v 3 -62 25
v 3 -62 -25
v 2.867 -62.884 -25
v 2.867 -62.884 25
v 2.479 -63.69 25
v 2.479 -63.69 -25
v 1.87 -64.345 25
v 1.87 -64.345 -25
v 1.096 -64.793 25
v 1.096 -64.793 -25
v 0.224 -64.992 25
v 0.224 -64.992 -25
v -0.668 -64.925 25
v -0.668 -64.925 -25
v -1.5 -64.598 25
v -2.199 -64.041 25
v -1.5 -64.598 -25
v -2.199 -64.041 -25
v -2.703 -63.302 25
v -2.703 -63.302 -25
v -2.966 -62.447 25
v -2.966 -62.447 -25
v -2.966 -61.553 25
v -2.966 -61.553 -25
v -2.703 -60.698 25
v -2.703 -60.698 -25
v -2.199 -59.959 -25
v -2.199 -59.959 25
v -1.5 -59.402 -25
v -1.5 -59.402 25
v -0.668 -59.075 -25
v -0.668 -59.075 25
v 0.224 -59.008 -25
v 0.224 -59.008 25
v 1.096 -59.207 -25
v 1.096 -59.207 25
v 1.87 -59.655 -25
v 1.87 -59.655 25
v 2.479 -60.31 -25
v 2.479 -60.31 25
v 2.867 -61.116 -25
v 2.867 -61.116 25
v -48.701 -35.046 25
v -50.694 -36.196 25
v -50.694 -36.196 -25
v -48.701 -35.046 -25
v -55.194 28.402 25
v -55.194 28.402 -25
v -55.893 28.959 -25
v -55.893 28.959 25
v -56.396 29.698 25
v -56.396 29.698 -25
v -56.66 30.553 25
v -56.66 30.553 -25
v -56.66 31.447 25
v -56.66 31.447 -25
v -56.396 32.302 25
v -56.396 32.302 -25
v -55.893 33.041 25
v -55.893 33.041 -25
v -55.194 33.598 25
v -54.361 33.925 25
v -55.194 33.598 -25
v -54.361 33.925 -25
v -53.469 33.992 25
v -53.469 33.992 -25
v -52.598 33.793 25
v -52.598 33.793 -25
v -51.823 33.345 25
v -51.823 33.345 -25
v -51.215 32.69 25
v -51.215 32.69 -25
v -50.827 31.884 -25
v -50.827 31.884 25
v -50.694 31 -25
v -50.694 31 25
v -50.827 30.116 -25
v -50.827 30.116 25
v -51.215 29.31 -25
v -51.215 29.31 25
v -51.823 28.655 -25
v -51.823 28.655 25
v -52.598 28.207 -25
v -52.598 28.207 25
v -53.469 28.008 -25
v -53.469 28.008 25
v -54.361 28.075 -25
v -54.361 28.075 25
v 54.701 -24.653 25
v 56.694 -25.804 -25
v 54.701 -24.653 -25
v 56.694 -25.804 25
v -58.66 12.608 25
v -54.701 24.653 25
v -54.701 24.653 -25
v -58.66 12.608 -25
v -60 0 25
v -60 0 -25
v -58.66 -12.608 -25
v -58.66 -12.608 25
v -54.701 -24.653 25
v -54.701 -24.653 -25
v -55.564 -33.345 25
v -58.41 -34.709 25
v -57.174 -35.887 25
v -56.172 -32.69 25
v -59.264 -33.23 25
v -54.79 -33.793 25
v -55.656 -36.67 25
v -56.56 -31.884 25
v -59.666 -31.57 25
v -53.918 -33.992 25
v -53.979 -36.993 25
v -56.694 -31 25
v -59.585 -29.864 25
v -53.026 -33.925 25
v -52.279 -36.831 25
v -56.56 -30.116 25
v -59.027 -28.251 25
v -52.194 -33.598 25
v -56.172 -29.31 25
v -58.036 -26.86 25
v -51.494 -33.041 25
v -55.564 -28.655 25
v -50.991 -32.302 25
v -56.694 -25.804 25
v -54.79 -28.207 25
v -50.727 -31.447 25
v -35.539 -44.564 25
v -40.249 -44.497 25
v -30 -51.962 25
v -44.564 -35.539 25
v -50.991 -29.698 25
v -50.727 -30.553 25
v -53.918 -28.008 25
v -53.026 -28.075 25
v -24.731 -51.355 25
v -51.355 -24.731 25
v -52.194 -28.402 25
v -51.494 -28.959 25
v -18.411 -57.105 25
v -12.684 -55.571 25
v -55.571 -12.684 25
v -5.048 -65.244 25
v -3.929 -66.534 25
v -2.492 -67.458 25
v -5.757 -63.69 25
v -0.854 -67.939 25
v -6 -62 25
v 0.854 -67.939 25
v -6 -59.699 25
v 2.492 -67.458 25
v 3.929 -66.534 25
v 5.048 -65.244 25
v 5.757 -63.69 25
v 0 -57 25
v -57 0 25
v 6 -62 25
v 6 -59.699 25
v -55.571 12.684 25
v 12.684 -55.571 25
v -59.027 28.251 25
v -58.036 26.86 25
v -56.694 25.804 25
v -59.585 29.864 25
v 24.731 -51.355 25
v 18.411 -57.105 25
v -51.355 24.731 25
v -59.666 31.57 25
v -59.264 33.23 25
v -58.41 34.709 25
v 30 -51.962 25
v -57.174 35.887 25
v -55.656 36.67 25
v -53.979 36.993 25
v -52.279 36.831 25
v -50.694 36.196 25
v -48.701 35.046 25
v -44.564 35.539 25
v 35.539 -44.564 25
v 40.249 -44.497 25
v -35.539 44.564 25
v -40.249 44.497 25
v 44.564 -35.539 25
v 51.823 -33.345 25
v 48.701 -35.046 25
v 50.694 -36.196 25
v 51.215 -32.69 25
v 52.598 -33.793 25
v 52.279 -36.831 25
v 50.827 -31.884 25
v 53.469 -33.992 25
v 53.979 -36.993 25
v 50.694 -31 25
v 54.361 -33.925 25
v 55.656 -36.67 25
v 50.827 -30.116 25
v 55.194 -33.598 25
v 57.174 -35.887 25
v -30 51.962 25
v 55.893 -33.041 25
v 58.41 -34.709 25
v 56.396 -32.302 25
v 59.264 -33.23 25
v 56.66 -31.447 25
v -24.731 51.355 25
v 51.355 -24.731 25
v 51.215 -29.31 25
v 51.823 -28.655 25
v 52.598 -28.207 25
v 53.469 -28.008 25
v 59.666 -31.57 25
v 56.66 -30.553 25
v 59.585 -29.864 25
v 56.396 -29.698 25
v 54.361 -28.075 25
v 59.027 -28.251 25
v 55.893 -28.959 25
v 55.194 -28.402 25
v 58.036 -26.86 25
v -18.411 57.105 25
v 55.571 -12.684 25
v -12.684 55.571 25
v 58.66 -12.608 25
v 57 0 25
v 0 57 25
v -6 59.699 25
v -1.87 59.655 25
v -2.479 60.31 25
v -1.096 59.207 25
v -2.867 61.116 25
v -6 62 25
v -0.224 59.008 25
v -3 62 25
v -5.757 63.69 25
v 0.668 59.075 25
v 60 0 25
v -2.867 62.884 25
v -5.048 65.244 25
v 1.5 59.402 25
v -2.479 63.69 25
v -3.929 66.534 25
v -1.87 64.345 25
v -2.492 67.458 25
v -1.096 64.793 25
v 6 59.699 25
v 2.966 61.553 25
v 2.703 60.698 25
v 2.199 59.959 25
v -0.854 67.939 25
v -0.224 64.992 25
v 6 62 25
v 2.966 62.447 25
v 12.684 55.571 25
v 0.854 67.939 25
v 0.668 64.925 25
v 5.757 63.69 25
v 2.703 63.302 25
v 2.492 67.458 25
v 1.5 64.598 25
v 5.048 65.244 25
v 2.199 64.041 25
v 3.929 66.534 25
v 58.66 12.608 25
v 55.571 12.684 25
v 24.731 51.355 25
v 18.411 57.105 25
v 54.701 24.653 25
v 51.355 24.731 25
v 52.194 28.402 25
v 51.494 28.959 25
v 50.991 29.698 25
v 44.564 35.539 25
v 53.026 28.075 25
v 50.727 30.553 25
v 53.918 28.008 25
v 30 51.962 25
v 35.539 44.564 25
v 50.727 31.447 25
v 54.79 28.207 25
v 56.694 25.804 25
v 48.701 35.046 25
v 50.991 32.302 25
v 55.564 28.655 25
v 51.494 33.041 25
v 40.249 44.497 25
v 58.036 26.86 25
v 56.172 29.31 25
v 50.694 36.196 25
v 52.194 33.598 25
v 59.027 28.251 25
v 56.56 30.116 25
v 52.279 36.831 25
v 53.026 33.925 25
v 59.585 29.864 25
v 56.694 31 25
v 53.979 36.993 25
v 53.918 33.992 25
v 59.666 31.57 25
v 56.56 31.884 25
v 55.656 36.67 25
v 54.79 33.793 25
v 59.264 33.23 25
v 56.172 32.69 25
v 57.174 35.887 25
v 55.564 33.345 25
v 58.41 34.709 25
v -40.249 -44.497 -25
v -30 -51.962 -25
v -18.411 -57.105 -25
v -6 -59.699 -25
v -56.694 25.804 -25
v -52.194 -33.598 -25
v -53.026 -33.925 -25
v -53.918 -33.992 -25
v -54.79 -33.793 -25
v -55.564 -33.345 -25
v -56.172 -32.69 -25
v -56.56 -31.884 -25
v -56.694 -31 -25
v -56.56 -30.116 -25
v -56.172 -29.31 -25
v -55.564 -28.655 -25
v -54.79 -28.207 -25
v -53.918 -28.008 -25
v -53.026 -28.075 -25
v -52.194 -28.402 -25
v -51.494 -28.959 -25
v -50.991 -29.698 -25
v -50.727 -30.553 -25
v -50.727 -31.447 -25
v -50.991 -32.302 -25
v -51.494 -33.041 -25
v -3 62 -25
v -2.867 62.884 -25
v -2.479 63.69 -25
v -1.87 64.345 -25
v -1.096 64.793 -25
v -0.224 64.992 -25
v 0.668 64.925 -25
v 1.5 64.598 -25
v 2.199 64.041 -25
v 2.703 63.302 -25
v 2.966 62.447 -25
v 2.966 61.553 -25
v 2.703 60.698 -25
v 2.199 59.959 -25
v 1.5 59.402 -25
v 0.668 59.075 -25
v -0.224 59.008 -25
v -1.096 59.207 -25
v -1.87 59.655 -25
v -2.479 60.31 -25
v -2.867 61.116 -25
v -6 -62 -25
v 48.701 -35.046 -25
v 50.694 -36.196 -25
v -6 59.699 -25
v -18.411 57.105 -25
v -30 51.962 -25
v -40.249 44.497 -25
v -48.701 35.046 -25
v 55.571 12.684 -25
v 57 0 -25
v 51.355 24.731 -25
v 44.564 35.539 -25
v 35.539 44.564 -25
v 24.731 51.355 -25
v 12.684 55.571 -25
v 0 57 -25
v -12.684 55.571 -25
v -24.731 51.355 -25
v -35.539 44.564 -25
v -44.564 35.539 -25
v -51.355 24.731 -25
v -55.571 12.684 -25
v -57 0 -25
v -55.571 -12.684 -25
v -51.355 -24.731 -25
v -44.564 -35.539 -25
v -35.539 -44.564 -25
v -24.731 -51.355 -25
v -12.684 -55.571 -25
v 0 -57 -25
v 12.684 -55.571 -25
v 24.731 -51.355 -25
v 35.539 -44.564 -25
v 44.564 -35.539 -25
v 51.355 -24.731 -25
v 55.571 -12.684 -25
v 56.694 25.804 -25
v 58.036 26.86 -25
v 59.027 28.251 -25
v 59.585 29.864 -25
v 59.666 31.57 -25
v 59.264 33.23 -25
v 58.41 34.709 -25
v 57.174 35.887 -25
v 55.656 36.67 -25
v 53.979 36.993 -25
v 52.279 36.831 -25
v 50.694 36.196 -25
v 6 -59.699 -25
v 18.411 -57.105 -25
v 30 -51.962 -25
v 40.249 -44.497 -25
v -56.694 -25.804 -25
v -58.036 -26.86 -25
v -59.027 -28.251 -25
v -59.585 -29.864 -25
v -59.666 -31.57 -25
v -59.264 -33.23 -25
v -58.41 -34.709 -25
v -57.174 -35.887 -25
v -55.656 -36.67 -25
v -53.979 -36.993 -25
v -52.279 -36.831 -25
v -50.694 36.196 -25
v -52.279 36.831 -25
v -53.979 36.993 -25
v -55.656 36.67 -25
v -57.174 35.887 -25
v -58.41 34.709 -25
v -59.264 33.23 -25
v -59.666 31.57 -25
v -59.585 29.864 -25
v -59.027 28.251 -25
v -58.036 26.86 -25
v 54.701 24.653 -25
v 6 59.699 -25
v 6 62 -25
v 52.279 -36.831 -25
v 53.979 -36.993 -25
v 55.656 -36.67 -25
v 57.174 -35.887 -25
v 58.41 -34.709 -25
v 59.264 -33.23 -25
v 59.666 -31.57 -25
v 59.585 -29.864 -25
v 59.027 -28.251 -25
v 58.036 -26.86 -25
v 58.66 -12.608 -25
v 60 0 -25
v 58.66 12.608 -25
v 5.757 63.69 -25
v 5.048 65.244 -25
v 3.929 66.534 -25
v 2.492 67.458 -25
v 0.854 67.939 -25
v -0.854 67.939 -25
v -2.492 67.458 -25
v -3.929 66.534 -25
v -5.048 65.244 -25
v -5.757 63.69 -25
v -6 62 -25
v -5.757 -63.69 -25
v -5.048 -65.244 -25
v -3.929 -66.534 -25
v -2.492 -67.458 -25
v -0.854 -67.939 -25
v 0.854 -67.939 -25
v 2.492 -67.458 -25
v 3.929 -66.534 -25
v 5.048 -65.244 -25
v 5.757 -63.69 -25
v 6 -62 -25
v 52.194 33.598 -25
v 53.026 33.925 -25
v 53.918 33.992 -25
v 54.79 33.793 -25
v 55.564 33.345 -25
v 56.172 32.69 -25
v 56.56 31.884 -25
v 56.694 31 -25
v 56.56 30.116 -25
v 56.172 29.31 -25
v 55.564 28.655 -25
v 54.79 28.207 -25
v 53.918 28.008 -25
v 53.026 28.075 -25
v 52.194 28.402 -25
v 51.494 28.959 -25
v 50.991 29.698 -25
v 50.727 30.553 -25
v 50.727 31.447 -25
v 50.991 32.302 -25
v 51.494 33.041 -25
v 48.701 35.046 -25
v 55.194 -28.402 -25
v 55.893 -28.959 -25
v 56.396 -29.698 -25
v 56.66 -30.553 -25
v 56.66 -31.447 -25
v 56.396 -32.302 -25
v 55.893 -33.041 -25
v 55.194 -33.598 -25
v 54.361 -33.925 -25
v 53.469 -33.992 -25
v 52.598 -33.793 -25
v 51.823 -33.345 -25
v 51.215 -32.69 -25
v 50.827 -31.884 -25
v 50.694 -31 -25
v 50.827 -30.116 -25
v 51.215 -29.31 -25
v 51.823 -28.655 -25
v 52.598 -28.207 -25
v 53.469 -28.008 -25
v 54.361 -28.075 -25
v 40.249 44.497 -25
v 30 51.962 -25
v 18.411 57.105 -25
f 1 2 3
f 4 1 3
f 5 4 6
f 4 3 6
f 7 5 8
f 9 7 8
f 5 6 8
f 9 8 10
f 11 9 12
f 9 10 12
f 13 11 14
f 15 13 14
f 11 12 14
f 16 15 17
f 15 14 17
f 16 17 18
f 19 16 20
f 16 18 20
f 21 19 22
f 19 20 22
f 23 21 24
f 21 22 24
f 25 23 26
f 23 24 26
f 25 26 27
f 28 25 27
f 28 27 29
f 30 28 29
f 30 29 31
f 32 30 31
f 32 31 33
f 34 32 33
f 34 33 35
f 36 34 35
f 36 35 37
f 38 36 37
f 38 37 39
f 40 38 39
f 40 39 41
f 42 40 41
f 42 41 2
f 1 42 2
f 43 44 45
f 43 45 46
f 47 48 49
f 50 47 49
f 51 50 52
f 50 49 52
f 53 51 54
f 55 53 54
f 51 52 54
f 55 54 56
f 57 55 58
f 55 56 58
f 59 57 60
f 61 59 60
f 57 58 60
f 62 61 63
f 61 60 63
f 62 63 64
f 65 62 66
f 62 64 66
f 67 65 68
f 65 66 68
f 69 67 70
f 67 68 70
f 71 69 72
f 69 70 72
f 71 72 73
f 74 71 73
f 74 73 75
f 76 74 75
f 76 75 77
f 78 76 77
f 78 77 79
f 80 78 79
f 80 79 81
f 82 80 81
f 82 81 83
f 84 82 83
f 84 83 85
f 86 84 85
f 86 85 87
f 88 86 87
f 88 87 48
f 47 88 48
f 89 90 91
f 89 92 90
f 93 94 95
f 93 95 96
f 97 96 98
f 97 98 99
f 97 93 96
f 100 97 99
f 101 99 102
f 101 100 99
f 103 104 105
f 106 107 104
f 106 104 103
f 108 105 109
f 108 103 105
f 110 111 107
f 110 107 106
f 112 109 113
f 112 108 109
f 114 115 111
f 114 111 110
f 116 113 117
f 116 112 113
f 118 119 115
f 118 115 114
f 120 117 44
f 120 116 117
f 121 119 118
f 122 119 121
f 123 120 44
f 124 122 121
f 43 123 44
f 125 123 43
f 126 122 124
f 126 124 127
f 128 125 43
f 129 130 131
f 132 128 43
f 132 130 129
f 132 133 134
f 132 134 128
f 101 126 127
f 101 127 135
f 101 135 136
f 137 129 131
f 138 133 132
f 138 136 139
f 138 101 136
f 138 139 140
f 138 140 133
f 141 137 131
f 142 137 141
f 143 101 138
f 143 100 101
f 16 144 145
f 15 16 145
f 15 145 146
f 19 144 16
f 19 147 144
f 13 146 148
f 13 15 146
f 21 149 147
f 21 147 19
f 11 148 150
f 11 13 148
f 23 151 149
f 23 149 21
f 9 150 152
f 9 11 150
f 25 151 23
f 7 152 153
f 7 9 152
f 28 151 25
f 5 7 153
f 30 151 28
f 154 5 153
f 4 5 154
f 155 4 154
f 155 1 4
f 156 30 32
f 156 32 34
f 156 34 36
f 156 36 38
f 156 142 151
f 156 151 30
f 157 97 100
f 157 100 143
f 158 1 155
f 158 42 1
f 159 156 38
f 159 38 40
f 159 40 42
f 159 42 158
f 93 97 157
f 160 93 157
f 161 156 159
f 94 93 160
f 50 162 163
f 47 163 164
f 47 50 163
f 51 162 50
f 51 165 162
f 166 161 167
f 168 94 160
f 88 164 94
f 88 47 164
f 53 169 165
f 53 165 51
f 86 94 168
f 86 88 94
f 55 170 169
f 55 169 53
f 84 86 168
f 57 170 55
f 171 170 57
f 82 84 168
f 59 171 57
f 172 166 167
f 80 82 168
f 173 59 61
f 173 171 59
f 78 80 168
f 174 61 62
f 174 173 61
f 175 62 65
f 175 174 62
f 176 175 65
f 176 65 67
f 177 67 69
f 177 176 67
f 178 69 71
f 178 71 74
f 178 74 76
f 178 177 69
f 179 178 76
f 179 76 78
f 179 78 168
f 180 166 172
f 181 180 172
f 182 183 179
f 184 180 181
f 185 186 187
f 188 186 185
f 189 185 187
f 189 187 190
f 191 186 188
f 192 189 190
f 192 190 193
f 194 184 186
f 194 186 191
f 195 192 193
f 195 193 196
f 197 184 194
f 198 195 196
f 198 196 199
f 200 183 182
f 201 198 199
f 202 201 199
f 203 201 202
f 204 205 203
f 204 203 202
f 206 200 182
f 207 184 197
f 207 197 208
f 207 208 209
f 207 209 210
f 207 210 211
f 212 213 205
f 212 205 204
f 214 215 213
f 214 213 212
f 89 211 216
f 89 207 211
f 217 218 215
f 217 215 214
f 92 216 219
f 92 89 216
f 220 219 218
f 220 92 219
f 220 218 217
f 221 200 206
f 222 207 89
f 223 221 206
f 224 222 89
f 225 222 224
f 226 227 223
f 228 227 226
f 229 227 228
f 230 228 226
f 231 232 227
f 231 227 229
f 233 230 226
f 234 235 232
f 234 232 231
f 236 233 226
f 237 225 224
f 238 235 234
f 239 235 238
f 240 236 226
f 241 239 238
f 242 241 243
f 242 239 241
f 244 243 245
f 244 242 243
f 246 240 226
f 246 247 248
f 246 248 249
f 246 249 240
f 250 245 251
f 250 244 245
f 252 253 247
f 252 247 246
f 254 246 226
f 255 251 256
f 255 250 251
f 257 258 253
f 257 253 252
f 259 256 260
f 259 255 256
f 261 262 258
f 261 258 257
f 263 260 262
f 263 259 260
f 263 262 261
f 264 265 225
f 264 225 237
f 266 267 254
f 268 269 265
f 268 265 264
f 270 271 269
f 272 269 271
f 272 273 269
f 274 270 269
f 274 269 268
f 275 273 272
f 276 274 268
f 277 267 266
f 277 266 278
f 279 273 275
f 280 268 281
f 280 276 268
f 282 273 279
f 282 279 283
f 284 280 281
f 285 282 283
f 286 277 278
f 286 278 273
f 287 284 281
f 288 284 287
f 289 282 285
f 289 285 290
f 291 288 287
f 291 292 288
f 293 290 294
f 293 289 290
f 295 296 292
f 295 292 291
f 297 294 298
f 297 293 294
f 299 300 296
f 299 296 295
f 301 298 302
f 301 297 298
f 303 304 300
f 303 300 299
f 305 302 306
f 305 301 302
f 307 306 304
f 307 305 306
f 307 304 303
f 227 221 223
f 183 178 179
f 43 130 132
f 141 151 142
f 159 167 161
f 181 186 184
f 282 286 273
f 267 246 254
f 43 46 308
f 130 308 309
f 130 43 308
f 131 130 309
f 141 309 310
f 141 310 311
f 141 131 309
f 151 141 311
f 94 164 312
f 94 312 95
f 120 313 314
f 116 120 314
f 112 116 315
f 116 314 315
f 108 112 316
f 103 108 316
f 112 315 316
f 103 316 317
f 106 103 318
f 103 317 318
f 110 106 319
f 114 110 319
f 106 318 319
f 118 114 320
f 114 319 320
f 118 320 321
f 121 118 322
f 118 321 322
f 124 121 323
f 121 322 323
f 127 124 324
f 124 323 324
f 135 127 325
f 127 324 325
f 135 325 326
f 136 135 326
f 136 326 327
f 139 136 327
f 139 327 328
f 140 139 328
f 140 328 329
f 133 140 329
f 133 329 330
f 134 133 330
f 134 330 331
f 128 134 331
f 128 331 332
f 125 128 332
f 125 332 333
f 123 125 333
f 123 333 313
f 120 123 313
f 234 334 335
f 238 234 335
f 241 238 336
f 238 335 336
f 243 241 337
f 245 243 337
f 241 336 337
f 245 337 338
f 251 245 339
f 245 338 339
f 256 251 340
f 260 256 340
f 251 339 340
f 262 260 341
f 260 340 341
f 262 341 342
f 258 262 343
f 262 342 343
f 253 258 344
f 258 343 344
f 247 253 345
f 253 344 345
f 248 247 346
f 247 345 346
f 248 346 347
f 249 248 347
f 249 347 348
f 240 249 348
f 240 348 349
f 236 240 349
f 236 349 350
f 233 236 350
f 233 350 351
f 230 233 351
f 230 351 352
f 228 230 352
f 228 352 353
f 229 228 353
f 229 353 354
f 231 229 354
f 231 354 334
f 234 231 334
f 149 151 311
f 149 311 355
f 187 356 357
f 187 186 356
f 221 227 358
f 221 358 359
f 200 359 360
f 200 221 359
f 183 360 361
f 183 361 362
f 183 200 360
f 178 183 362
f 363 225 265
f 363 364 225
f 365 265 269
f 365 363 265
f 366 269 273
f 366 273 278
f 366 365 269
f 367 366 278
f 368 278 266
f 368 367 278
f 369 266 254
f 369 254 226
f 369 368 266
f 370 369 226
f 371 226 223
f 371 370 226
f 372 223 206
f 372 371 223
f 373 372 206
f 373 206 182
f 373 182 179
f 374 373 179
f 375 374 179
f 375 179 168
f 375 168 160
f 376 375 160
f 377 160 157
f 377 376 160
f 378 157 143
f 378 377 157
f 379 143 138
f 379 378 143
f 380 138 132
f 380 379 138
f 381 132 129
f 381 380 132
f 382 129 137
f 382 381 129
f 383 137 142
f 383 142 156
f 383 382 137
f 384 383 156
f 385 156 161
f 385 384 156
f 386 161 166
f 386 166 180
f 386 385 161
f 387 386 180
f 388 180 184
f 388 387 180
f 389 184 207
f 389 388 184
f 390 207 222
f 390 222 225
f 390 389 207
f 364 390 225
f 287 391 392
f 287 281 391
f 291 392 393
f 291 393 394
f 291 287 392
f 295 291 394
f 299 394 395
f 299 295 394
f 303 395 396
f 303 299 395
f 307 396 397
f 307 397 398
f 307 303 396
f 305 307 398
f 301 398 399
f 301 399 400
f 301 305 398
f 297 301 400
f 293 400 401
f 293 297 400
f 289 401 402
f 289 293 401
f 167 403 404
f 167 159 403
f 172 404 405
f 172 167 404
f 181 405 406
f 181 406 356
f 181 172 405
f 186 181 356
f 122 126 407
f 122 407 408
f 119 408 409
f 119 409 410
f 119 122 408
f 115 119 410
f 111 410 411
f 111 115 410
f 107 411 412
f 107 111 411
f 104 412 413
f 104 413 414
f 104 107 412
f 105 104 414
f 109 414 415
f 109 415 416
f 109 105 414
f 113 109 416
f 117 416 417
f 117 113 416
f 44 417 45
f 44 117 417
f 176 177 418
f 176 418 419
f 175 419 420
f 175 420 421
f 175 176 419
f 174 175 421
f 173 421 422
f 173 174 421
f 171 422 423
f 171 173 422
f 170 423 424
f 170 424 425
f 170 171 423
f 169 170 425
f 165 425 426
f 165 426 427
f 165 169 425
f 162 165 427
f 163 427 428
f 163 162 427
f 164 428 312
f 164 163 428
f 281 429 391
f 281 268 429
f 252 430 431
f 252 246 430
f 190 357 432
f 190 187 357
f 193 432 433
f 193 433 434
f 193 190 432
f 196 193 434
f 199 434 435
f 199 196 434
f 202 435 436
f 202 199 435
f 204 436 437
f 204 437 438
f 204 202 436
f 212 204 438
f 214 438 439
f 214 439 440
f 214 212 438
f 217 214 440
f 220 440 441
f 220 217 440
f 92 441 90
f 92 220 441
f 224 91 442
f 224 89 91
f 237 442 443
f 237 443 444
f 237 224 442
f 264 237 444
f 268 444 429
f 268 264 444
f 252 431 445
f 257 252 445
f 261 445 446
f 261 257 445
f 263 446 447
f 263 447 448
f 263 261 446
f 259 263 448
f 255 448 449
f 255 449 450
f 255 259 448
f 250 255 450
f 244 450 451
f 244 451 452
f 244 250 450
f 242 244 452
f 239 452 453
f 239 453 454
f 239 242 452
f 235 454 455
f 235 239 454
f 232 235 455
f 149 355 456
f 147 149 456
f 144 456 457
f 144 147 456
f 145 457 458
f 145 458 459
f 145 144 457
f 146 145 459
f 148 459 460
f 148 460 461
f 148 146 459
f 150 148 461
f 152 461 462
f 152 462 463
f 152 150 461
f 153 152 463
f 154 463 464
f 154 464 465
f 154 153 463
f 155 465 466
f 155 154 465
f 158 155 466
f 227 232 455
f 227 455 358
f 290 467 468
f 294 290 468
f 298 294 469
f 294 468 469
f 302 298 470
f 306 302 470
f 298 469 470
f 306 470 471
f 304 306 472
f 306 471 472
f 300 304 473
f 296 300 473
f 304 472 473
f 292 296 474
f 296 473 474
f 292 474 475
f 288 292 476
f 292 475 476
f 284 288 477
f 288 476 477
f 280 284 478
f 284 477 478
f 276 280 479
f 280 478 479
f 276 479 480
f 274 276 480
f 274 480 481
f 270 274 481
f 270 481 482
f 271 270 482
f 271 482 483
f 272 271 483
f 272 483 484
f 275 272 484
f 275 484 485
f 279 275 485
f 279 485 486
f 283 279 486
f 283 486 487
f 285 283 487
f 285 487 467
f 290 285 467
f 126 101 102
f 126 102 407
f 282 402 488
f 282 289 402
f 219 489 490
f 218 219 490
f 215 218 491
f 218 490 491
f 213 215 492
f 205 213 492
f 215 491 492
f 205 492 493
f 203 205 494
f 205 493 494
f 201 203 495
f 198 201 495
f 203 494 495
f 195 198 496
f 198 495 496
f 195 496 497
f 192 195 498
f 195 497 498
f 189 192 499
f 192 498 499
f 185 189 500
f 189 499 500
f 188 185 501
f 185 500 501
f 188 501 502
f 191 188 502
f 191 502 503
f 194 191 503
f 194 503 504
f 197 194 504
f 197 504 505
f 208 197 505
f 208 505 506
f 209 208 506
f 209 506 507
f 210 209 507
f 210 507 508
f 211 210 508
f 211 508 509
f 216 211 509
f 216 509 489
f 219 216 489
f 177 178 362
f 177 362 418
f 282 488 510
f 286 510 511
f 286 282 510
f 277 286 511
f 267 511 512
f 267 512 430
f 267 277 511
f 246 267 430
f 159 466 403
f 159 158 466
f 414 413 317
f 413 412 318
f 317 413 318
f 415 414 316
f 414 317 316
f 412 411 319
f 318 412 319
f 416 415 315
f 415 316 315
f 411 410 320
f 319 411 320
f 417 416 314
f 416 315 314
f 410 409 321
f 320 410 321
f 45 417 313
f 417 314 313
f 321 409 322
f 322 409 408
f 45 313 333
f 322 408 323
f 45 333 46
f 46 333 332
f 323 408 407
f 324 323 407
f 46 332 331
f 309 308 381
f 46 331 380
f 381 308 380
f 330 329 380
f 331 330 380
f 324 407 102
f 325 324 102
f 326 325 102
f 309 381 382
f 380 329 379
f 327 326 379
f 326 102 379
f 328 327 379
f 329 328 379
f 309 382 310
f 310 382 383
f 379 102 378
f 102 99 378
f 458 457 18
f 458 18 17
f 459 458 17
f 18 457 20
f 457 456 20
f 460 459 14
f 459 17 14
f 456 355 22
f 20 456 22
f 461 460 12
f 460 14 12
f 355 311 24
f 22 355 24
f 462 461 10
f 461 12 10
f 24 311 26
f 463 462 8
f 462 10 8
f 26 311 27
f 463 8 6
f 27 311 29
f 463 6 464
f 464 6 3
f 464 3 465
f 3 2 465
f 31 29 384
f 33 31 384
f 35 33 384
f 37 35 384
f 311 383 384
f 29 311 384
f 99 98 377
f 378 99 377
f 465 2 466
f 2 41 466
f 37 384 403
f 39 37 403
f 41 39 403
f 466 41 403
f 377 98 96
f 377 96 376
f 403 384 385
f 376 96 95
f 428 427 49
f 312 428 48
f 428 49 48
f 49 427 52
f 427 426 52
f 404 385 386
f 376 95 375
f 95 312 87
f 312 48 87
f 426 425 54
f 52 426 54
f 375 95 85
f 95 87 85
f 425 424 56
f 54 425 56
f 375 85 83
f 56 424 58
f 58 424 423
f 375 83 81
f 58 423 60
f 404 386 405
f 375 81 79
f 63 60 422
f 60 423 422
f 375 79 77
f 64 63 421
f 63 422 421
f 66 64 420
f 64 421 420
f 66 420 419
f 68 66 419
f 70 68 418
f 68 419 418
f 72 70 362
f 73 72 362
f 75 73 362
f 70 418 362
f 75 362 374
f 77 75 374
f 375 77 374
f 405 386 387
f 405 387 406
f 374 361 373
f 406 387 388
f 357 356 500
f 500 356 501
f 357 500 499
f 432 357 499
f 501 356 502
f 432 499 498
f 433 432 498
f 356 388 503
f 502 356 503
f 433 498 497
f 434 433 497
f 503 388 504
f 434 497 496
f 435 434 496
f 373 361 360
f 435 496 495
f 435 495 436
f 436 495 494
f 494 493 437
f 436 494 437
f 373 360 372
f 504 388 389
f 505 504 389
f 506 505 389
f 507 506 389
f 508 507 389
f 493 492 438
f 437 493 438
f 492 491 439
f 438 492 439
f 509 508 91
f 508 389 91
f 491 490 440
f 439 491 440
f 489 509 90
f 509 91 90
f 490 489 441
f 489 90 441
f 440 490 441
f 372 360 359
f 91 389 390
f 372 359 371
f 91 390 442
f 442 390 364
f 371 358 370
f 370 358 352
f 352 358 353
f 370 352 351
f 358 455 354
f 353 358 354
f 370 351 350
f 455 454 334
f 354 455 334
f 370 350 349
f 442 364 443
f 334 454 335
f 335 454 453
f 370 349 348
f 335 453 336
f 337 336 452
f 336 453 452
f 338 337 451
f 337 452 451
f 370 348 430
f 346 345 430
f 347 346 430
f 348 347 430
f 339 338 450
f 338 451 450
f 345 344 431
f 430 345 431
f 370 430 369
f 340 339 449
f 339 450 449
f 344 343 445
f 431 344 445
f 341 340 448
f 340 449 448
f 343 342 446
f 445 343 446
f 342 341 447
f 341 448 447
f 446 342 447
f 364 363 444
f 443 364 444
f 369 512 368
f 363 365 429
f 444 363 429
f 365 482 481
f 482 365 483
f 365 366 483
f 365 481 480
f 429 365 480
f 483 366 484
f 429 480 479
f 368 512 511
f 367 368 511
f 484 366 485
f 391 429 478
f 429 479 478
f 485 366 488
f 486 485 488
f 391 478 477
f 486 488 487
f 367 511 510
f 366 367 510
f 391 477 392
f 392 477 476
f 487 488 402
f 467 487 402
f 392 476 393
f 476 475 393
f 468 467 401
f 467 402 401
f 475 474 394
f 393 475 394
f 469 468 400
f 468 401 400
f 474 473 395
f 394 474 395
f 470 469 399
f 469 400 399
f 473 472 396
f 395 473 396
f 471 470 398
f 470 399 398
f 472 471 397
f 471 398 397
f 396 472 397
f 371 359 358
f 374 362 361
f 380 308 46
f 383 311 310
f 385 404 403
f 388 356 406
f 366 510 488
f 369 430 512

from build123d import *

# Parameters (mm, degrees)
SKETCH1_R           = 57
BOSS_EXTRUDE1_DEPTH = 25
SKETCH3_R           = 3
CUT_EXTRUDE1_DEPTH  = 104.556747728
CIRPATTERN1_COUNT   = 6


with BuildPart() as part:
    # Sketch1 → Boss-Extrude1 (new, symmetric)
    with BuildSketch(Plane.XY):
        with BuildLine():
            Line((6, 59.699246226), (6, 62))
            ThreePointArc((6, 62), (0, 68), (-6, 62))
            Line((-6, 62), (-6, 59.699246226))
            ThreePointArc((-6, 59.699246226), (-30, 51.961524227), (-48.701063819, 35.045775536))
            Line((-48.701063819, 35.045775536), (-50.693575035, 36.196152423))
            ThreePointArc((-50.693575035, 36.196152423), (-58.889727457, 34), (-56.693575035, 25.803847577))
            Line((-56.693575035, 25.803847577), (-54.701063819, 24.65347069))
            ThreePointArc((-54.701063819, 24.65347069), (-60, 0), (-54.701063819, -24.65347069))
            Line((-54.701063819, -24.65347069), (-56.693575035, -25.803847577))
            ThreePointArc((-56.693575035, -25.803847577), (-58.889727457, -34), (-50.693575035, -36.196152423))
            Line((-50.693575035, -36.196152423), (-48.701063819, -35.045775536))
            ThreePointArc((-48.701063819, -35.045775536), (-30, -51.961524227), (-6, -59.699246226))
            Line((-6, -59.699246226), (-6, -62))
            ThreePointArc((-6, -62), (0, -68), (6, -62))
            Line((6, -62), (6, -59.699246226))
            ThreePointArc((6, -59.699246226), (30, -51.961524227), (48.701063819, -35.045775536))
            Line((48.701063819, -35.045775536), (50.693575035, -36.196152423))
            ThreePointArc((50.693575035, -36.196152423), (58.889727457, -34), (56.693575035, -25.803847577))
            Line((56.693575035, -25.803847577), (54.701063819, -24.65347069))
            ThreePointArc((54.701063819, -24.65347069), (60, 0), (54.701063819, 24.65347069))
            Line((54.701063819, 24.65347069), (56.693575035, 25.803847577))
            ThreePointArc((56.693575035, 25.803847577), (58.889727457, 34), (50.693575035, 36.196152423))
            Line((50.693575035, 36.196152423), (48.701063819, 35.045775536))
            ThreePointArc((48.701063819, 35.045775536), (30, 51.961524227), (6, 59.699246226))
        make_face()
        Circle(SKETCH1_R, mode=Mode.SUBTRACT)
    extrude(amount=BOSS_EXTRUDE1_DEPTH, both=True)

    # Sketch3 → Cut-Extrude1 (cut, through all)
    with BuildSketch(Plane(origin=(0, 0, -25), x_dir=(-1, 0, 0), z_dir=(0, 0, -1))):
        with Locations((0, 62)):
            Circle(SKETCH3_R)
    cut_extrude1 = extrude(amount=-CUT_EXTRUDE1_DEPTH, mode=Mode.SUBTRACT)

    # CirPattern1: Cut-Extrude1 ×6 about axis
    cirpattern1_axis = Axis((0, 0, 0), (0, 0, 1))
    for i in range(1, CIRPATTERN1_COUNT):
        add(cut_extrude1.rotate(cirpattern1_axis, i * 360 / CIRPATTERN1_COUNT), mode=Mode.SUBTRACT)


solid = part.part
